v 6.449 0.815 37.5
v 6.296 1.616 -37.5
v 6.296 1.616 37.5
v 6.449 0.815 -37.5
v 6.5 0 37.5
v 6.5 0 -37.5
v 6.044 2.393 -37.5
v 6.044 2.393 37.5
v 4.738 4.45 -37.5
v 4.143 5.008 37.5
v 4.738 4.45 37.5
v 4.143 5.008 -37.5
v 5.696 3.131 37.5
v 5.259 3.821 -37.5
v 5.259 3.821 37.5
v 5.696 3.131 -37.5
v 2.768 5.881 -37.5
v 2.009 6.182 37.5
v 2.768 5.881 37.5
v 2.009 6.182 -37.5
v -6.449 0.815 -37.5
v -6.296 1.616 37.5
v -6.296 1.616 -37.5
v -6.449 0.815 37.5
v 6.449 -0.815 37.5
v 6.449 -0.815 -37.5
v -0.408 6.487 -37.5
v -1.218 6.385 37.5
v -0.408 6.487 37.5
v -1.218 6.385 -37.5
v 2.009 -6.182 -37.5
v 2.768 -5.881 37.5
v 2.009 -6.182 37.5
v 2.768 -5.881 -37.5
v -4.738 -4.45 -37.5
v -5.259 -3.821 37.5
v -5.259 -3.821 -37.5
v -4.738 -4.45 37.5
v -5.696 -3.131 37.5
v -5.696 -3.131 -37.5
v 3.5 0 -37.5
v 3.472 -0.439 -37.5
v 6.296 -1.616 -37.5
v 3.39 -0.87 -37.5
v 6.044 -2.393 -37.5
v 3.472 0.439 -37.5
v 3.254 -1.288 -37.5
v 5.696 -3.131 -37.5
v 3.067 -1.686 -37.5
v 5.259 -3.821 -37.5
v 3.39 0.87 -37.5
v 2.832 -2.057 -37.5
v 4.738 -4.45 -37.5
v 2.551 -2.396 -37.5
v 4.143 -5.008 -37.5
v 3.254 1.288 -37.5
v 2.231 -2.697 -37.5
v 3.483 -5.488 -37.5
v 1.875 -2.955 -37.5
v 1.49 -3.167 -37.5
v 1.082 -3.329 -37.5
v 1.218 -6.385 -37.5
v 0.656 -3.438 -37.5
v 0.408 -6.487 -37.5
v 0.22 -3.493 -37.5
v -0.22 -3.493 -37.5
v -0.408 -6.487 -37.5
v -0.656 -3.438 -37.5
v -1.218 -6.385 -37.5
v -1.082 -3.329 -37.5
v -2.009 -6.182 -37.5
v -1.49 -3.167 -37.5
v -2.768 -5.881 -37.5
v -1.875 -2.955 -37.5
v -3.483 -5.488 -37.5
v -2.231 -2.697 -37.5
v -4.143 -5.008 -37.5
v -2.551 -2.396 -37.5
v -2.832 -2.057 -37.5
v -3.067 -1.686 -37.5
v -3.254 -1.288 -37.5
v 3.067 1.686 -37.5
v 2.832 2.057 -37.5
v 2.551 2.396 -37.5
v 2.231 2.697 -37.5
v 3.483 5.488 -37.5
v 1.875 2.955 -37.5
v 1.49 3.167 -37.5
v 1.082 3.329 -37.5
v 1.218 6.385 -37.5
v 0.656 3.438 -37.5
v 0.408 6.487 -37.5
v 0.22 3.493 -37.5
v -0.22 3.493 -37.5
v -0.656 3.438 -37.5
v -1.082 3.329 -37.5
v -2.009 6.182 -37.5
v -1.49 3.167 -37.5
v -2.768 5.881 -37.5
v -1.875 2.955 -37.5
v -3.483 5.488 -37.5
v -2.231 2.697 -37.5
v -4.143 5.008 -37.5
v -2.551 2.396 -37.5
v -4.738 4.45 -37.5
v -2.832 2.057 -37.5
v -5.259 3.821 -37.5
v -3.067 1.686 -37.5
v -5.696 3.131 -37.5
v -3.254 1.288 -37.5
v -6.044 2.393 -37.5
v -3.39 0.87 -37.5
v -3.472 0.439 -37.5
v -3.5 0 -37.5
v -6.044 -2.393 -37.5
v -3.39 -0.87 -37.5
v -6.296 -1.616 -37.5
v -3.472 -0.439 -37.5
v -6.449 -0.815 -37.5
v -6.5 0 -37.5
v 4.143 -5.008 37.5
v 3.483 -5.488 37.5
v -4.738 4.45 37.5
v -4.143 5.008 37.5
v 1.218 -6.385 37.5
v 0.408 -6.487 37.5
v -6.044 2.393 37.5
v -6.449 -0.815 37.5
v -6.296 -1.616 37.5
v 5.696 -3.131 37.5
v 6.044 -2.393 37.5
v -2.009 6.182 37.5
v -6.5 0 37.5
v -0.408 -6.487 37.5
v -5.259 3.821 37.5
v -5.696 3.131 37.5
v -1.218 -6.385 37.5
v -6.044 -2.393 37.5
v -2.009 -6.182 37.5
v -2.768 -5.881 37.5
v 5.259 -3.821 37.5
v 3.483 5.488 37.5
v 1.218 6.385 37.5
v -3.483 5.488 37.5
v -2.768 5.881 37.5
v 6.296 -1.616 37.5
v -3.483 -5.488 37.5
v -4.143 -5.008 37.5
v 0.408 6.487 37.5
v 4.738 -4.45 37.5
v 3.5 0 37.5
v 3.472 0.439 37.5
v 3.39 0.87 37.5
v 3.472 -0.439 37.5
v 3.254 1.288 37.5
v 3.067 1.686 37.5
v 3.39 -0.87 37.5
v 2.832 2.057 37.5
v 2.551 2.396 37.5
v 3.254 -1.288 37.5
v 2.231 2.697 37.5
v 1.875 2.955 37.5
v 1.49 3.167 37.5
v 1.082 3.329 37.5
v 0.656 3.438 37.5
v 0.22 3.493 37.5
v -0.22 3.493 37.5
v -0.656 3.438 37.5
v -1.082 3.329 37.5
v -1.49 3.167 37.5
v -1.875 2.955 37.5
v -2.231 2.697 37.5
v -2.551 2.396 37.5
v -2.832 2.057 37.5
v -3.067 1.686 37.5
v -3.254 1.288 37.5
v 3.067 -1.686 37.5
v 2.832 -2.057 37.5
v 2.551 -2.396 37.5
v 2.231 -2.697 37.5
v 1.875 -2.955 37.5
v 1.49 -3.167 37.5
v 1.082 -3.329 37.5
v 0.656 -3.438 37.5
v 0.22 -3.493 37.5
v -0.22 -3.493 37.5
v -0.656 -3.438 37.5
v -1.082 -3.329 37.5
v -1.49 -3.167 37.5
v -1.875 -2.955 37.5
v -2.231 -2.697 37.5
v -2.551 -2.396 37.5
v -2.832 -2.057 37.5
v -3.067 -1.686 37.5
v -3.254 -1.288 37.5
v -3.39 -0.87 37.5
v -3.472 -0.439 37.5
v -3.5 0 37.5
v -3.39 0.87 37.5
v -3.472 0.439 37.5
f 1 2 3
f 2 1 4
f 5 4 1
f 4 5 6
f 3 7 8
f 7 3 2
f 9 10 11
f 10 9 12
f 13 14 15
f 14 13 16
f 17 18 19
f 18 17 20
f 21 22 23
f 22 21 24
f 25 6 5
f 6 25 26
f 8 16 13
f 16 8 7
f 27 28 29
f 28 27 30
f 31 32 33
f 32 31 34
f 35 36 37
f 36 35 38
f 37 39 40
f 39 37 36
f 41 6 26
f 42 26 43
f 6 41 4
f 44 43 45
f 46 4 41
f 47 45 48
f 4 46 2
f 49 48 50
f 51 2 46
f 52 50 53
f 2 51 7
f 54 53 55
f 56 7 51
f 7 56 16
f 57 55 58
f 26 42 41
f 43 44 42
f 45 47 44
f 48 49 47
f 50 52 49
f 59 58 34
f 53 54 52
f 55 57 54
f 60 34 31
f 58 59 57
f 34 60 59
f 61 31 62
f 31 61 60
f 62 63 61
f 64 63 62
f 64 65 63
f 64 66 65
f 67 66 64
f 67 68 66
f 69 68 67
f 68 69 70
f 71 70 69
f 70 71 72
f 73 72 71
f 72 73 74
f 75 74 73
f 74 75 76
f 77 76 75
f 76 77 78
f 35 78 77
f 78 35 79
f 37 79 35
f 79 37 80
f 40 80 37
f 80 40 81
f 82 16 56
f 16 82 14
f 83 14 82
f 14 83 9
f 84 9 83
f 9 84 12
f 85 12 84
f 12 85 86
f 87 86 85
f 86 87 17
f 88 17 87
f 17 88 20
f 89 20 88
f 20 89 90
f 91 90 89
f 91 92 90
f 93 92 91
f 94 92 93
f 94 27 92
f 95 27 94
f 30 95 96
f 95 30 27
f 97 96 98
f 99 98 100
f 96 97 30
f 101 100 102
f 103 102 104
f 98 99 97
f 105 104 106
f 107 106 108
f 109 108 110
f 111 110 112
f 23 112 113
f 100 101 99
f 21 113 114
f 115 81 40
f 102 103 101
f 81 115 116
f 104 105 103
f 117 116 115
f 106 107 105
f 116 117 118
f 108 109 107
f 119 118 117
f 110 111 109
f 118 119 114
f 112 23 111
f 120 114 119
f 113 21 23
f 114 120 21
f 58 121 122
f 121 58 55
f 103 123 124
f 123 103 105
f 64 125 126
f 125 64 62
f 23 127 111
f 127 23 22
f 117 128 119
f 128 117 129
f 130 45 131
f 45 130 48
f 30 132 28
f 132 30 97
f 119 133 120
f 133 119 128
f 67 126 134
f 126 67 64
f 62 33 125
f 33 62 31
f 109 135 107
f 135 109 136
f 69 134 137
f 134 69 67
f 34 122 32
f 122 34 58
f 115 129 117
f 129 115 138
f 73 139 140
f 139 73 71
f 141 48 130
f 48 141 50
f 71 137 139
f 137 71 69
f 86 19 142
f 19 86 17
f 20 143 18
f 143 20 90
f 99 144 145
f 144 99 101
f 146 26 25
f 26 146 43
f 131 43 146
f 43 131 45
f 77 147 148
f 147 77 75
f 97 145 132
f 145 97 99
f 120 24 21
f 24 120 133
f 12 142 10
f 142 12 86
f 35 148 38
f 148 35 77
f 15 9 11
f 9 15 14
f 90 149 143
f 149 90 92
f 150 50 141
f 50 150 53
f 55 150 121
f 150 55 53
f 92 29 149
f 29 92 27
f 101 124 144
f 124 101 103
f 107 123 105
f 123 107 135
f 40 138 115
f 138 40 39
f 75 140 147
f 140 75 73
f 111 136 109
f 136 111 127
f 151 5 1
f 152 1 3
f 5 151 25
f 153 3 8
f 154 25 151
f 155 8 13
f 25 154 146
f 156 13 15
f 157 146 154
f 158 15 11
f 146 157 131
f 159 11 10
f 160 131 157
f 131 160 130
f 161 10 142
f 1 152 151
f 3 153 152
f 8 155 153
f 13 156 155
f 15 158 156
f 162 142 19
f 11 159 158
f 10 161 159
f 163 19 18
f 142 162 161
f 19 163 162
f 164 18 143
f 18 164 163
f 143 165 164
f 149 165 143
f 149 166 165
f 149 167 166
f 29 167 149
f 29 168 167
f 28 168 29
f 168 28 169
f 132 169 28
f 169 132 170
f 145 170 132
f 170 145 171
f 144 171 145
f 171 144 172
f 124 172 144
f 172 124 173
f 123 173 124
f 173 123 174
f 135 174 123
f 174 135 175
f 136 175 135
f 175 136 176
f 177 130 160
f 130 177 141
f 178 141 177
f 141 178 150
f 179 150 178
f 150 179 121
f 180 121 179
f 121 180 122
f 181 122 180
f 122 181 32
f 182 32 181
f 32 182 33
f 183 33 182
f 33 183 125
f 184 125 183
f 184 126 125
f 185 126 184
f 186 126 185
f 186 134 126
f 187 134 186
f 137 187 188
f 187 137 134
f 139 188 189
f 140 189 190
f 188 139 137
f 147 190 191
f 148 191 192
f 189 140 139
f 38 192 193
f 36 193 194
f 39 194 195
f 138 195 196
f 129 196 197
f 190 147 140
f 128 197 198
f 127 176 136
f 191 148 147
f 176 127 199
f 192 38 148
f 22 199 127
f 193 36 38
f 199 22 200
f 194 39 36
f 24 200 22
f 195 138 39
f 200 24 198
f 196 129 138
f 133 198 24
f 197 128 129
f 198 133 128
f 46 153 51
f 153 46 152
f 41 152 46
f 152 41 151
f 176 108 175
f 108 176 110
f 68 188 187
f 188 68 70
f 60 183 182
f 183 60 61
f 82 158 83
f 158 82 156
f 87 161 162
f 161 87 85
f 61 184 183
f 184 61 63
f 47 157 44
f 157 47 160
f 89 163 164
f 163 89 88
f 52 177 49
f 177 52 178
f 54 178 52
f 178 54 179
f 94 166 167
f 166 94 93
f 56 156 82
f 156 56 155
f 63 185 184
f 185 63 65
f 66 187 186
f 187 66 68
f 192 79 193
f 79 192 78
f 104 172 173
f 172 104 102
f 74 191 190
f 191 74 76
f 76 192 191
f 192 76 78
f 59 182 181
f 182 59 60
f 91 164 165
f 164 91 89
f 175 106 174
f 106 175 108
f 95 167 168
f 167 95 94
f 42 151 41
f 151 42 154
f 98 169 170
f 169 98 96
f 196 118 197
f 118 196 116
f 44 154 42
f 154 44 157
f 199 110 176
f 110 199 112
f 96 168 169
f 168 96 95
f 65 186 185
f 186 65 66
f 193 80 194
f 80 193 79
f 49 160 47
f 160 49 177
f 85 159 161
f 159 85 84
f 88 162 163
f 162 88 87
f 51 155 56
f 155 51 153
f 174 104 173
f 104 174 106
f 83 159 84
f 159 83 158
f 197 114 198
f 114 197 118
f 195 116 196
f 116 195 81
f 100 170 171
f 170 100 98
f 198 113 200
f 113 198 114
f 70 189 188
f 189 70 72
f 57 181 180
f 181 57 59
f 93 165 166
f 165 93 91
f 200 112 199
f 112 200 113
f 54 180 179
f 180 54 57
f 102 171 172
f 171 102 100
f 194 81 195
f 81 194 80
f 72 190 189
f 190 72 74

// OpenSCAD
$fn = 50;


difference() {
	union() {
		translate(v = [0, 0, -37.5000000000]) {
			cylinder(h = 75, r = 6.5000000000);
		}
	}
	union() {
		translate(v = [0, 0, -100.0000000000]) {
			cylinder(h = 200, r = 3.5000000000);
		}
	}
}
